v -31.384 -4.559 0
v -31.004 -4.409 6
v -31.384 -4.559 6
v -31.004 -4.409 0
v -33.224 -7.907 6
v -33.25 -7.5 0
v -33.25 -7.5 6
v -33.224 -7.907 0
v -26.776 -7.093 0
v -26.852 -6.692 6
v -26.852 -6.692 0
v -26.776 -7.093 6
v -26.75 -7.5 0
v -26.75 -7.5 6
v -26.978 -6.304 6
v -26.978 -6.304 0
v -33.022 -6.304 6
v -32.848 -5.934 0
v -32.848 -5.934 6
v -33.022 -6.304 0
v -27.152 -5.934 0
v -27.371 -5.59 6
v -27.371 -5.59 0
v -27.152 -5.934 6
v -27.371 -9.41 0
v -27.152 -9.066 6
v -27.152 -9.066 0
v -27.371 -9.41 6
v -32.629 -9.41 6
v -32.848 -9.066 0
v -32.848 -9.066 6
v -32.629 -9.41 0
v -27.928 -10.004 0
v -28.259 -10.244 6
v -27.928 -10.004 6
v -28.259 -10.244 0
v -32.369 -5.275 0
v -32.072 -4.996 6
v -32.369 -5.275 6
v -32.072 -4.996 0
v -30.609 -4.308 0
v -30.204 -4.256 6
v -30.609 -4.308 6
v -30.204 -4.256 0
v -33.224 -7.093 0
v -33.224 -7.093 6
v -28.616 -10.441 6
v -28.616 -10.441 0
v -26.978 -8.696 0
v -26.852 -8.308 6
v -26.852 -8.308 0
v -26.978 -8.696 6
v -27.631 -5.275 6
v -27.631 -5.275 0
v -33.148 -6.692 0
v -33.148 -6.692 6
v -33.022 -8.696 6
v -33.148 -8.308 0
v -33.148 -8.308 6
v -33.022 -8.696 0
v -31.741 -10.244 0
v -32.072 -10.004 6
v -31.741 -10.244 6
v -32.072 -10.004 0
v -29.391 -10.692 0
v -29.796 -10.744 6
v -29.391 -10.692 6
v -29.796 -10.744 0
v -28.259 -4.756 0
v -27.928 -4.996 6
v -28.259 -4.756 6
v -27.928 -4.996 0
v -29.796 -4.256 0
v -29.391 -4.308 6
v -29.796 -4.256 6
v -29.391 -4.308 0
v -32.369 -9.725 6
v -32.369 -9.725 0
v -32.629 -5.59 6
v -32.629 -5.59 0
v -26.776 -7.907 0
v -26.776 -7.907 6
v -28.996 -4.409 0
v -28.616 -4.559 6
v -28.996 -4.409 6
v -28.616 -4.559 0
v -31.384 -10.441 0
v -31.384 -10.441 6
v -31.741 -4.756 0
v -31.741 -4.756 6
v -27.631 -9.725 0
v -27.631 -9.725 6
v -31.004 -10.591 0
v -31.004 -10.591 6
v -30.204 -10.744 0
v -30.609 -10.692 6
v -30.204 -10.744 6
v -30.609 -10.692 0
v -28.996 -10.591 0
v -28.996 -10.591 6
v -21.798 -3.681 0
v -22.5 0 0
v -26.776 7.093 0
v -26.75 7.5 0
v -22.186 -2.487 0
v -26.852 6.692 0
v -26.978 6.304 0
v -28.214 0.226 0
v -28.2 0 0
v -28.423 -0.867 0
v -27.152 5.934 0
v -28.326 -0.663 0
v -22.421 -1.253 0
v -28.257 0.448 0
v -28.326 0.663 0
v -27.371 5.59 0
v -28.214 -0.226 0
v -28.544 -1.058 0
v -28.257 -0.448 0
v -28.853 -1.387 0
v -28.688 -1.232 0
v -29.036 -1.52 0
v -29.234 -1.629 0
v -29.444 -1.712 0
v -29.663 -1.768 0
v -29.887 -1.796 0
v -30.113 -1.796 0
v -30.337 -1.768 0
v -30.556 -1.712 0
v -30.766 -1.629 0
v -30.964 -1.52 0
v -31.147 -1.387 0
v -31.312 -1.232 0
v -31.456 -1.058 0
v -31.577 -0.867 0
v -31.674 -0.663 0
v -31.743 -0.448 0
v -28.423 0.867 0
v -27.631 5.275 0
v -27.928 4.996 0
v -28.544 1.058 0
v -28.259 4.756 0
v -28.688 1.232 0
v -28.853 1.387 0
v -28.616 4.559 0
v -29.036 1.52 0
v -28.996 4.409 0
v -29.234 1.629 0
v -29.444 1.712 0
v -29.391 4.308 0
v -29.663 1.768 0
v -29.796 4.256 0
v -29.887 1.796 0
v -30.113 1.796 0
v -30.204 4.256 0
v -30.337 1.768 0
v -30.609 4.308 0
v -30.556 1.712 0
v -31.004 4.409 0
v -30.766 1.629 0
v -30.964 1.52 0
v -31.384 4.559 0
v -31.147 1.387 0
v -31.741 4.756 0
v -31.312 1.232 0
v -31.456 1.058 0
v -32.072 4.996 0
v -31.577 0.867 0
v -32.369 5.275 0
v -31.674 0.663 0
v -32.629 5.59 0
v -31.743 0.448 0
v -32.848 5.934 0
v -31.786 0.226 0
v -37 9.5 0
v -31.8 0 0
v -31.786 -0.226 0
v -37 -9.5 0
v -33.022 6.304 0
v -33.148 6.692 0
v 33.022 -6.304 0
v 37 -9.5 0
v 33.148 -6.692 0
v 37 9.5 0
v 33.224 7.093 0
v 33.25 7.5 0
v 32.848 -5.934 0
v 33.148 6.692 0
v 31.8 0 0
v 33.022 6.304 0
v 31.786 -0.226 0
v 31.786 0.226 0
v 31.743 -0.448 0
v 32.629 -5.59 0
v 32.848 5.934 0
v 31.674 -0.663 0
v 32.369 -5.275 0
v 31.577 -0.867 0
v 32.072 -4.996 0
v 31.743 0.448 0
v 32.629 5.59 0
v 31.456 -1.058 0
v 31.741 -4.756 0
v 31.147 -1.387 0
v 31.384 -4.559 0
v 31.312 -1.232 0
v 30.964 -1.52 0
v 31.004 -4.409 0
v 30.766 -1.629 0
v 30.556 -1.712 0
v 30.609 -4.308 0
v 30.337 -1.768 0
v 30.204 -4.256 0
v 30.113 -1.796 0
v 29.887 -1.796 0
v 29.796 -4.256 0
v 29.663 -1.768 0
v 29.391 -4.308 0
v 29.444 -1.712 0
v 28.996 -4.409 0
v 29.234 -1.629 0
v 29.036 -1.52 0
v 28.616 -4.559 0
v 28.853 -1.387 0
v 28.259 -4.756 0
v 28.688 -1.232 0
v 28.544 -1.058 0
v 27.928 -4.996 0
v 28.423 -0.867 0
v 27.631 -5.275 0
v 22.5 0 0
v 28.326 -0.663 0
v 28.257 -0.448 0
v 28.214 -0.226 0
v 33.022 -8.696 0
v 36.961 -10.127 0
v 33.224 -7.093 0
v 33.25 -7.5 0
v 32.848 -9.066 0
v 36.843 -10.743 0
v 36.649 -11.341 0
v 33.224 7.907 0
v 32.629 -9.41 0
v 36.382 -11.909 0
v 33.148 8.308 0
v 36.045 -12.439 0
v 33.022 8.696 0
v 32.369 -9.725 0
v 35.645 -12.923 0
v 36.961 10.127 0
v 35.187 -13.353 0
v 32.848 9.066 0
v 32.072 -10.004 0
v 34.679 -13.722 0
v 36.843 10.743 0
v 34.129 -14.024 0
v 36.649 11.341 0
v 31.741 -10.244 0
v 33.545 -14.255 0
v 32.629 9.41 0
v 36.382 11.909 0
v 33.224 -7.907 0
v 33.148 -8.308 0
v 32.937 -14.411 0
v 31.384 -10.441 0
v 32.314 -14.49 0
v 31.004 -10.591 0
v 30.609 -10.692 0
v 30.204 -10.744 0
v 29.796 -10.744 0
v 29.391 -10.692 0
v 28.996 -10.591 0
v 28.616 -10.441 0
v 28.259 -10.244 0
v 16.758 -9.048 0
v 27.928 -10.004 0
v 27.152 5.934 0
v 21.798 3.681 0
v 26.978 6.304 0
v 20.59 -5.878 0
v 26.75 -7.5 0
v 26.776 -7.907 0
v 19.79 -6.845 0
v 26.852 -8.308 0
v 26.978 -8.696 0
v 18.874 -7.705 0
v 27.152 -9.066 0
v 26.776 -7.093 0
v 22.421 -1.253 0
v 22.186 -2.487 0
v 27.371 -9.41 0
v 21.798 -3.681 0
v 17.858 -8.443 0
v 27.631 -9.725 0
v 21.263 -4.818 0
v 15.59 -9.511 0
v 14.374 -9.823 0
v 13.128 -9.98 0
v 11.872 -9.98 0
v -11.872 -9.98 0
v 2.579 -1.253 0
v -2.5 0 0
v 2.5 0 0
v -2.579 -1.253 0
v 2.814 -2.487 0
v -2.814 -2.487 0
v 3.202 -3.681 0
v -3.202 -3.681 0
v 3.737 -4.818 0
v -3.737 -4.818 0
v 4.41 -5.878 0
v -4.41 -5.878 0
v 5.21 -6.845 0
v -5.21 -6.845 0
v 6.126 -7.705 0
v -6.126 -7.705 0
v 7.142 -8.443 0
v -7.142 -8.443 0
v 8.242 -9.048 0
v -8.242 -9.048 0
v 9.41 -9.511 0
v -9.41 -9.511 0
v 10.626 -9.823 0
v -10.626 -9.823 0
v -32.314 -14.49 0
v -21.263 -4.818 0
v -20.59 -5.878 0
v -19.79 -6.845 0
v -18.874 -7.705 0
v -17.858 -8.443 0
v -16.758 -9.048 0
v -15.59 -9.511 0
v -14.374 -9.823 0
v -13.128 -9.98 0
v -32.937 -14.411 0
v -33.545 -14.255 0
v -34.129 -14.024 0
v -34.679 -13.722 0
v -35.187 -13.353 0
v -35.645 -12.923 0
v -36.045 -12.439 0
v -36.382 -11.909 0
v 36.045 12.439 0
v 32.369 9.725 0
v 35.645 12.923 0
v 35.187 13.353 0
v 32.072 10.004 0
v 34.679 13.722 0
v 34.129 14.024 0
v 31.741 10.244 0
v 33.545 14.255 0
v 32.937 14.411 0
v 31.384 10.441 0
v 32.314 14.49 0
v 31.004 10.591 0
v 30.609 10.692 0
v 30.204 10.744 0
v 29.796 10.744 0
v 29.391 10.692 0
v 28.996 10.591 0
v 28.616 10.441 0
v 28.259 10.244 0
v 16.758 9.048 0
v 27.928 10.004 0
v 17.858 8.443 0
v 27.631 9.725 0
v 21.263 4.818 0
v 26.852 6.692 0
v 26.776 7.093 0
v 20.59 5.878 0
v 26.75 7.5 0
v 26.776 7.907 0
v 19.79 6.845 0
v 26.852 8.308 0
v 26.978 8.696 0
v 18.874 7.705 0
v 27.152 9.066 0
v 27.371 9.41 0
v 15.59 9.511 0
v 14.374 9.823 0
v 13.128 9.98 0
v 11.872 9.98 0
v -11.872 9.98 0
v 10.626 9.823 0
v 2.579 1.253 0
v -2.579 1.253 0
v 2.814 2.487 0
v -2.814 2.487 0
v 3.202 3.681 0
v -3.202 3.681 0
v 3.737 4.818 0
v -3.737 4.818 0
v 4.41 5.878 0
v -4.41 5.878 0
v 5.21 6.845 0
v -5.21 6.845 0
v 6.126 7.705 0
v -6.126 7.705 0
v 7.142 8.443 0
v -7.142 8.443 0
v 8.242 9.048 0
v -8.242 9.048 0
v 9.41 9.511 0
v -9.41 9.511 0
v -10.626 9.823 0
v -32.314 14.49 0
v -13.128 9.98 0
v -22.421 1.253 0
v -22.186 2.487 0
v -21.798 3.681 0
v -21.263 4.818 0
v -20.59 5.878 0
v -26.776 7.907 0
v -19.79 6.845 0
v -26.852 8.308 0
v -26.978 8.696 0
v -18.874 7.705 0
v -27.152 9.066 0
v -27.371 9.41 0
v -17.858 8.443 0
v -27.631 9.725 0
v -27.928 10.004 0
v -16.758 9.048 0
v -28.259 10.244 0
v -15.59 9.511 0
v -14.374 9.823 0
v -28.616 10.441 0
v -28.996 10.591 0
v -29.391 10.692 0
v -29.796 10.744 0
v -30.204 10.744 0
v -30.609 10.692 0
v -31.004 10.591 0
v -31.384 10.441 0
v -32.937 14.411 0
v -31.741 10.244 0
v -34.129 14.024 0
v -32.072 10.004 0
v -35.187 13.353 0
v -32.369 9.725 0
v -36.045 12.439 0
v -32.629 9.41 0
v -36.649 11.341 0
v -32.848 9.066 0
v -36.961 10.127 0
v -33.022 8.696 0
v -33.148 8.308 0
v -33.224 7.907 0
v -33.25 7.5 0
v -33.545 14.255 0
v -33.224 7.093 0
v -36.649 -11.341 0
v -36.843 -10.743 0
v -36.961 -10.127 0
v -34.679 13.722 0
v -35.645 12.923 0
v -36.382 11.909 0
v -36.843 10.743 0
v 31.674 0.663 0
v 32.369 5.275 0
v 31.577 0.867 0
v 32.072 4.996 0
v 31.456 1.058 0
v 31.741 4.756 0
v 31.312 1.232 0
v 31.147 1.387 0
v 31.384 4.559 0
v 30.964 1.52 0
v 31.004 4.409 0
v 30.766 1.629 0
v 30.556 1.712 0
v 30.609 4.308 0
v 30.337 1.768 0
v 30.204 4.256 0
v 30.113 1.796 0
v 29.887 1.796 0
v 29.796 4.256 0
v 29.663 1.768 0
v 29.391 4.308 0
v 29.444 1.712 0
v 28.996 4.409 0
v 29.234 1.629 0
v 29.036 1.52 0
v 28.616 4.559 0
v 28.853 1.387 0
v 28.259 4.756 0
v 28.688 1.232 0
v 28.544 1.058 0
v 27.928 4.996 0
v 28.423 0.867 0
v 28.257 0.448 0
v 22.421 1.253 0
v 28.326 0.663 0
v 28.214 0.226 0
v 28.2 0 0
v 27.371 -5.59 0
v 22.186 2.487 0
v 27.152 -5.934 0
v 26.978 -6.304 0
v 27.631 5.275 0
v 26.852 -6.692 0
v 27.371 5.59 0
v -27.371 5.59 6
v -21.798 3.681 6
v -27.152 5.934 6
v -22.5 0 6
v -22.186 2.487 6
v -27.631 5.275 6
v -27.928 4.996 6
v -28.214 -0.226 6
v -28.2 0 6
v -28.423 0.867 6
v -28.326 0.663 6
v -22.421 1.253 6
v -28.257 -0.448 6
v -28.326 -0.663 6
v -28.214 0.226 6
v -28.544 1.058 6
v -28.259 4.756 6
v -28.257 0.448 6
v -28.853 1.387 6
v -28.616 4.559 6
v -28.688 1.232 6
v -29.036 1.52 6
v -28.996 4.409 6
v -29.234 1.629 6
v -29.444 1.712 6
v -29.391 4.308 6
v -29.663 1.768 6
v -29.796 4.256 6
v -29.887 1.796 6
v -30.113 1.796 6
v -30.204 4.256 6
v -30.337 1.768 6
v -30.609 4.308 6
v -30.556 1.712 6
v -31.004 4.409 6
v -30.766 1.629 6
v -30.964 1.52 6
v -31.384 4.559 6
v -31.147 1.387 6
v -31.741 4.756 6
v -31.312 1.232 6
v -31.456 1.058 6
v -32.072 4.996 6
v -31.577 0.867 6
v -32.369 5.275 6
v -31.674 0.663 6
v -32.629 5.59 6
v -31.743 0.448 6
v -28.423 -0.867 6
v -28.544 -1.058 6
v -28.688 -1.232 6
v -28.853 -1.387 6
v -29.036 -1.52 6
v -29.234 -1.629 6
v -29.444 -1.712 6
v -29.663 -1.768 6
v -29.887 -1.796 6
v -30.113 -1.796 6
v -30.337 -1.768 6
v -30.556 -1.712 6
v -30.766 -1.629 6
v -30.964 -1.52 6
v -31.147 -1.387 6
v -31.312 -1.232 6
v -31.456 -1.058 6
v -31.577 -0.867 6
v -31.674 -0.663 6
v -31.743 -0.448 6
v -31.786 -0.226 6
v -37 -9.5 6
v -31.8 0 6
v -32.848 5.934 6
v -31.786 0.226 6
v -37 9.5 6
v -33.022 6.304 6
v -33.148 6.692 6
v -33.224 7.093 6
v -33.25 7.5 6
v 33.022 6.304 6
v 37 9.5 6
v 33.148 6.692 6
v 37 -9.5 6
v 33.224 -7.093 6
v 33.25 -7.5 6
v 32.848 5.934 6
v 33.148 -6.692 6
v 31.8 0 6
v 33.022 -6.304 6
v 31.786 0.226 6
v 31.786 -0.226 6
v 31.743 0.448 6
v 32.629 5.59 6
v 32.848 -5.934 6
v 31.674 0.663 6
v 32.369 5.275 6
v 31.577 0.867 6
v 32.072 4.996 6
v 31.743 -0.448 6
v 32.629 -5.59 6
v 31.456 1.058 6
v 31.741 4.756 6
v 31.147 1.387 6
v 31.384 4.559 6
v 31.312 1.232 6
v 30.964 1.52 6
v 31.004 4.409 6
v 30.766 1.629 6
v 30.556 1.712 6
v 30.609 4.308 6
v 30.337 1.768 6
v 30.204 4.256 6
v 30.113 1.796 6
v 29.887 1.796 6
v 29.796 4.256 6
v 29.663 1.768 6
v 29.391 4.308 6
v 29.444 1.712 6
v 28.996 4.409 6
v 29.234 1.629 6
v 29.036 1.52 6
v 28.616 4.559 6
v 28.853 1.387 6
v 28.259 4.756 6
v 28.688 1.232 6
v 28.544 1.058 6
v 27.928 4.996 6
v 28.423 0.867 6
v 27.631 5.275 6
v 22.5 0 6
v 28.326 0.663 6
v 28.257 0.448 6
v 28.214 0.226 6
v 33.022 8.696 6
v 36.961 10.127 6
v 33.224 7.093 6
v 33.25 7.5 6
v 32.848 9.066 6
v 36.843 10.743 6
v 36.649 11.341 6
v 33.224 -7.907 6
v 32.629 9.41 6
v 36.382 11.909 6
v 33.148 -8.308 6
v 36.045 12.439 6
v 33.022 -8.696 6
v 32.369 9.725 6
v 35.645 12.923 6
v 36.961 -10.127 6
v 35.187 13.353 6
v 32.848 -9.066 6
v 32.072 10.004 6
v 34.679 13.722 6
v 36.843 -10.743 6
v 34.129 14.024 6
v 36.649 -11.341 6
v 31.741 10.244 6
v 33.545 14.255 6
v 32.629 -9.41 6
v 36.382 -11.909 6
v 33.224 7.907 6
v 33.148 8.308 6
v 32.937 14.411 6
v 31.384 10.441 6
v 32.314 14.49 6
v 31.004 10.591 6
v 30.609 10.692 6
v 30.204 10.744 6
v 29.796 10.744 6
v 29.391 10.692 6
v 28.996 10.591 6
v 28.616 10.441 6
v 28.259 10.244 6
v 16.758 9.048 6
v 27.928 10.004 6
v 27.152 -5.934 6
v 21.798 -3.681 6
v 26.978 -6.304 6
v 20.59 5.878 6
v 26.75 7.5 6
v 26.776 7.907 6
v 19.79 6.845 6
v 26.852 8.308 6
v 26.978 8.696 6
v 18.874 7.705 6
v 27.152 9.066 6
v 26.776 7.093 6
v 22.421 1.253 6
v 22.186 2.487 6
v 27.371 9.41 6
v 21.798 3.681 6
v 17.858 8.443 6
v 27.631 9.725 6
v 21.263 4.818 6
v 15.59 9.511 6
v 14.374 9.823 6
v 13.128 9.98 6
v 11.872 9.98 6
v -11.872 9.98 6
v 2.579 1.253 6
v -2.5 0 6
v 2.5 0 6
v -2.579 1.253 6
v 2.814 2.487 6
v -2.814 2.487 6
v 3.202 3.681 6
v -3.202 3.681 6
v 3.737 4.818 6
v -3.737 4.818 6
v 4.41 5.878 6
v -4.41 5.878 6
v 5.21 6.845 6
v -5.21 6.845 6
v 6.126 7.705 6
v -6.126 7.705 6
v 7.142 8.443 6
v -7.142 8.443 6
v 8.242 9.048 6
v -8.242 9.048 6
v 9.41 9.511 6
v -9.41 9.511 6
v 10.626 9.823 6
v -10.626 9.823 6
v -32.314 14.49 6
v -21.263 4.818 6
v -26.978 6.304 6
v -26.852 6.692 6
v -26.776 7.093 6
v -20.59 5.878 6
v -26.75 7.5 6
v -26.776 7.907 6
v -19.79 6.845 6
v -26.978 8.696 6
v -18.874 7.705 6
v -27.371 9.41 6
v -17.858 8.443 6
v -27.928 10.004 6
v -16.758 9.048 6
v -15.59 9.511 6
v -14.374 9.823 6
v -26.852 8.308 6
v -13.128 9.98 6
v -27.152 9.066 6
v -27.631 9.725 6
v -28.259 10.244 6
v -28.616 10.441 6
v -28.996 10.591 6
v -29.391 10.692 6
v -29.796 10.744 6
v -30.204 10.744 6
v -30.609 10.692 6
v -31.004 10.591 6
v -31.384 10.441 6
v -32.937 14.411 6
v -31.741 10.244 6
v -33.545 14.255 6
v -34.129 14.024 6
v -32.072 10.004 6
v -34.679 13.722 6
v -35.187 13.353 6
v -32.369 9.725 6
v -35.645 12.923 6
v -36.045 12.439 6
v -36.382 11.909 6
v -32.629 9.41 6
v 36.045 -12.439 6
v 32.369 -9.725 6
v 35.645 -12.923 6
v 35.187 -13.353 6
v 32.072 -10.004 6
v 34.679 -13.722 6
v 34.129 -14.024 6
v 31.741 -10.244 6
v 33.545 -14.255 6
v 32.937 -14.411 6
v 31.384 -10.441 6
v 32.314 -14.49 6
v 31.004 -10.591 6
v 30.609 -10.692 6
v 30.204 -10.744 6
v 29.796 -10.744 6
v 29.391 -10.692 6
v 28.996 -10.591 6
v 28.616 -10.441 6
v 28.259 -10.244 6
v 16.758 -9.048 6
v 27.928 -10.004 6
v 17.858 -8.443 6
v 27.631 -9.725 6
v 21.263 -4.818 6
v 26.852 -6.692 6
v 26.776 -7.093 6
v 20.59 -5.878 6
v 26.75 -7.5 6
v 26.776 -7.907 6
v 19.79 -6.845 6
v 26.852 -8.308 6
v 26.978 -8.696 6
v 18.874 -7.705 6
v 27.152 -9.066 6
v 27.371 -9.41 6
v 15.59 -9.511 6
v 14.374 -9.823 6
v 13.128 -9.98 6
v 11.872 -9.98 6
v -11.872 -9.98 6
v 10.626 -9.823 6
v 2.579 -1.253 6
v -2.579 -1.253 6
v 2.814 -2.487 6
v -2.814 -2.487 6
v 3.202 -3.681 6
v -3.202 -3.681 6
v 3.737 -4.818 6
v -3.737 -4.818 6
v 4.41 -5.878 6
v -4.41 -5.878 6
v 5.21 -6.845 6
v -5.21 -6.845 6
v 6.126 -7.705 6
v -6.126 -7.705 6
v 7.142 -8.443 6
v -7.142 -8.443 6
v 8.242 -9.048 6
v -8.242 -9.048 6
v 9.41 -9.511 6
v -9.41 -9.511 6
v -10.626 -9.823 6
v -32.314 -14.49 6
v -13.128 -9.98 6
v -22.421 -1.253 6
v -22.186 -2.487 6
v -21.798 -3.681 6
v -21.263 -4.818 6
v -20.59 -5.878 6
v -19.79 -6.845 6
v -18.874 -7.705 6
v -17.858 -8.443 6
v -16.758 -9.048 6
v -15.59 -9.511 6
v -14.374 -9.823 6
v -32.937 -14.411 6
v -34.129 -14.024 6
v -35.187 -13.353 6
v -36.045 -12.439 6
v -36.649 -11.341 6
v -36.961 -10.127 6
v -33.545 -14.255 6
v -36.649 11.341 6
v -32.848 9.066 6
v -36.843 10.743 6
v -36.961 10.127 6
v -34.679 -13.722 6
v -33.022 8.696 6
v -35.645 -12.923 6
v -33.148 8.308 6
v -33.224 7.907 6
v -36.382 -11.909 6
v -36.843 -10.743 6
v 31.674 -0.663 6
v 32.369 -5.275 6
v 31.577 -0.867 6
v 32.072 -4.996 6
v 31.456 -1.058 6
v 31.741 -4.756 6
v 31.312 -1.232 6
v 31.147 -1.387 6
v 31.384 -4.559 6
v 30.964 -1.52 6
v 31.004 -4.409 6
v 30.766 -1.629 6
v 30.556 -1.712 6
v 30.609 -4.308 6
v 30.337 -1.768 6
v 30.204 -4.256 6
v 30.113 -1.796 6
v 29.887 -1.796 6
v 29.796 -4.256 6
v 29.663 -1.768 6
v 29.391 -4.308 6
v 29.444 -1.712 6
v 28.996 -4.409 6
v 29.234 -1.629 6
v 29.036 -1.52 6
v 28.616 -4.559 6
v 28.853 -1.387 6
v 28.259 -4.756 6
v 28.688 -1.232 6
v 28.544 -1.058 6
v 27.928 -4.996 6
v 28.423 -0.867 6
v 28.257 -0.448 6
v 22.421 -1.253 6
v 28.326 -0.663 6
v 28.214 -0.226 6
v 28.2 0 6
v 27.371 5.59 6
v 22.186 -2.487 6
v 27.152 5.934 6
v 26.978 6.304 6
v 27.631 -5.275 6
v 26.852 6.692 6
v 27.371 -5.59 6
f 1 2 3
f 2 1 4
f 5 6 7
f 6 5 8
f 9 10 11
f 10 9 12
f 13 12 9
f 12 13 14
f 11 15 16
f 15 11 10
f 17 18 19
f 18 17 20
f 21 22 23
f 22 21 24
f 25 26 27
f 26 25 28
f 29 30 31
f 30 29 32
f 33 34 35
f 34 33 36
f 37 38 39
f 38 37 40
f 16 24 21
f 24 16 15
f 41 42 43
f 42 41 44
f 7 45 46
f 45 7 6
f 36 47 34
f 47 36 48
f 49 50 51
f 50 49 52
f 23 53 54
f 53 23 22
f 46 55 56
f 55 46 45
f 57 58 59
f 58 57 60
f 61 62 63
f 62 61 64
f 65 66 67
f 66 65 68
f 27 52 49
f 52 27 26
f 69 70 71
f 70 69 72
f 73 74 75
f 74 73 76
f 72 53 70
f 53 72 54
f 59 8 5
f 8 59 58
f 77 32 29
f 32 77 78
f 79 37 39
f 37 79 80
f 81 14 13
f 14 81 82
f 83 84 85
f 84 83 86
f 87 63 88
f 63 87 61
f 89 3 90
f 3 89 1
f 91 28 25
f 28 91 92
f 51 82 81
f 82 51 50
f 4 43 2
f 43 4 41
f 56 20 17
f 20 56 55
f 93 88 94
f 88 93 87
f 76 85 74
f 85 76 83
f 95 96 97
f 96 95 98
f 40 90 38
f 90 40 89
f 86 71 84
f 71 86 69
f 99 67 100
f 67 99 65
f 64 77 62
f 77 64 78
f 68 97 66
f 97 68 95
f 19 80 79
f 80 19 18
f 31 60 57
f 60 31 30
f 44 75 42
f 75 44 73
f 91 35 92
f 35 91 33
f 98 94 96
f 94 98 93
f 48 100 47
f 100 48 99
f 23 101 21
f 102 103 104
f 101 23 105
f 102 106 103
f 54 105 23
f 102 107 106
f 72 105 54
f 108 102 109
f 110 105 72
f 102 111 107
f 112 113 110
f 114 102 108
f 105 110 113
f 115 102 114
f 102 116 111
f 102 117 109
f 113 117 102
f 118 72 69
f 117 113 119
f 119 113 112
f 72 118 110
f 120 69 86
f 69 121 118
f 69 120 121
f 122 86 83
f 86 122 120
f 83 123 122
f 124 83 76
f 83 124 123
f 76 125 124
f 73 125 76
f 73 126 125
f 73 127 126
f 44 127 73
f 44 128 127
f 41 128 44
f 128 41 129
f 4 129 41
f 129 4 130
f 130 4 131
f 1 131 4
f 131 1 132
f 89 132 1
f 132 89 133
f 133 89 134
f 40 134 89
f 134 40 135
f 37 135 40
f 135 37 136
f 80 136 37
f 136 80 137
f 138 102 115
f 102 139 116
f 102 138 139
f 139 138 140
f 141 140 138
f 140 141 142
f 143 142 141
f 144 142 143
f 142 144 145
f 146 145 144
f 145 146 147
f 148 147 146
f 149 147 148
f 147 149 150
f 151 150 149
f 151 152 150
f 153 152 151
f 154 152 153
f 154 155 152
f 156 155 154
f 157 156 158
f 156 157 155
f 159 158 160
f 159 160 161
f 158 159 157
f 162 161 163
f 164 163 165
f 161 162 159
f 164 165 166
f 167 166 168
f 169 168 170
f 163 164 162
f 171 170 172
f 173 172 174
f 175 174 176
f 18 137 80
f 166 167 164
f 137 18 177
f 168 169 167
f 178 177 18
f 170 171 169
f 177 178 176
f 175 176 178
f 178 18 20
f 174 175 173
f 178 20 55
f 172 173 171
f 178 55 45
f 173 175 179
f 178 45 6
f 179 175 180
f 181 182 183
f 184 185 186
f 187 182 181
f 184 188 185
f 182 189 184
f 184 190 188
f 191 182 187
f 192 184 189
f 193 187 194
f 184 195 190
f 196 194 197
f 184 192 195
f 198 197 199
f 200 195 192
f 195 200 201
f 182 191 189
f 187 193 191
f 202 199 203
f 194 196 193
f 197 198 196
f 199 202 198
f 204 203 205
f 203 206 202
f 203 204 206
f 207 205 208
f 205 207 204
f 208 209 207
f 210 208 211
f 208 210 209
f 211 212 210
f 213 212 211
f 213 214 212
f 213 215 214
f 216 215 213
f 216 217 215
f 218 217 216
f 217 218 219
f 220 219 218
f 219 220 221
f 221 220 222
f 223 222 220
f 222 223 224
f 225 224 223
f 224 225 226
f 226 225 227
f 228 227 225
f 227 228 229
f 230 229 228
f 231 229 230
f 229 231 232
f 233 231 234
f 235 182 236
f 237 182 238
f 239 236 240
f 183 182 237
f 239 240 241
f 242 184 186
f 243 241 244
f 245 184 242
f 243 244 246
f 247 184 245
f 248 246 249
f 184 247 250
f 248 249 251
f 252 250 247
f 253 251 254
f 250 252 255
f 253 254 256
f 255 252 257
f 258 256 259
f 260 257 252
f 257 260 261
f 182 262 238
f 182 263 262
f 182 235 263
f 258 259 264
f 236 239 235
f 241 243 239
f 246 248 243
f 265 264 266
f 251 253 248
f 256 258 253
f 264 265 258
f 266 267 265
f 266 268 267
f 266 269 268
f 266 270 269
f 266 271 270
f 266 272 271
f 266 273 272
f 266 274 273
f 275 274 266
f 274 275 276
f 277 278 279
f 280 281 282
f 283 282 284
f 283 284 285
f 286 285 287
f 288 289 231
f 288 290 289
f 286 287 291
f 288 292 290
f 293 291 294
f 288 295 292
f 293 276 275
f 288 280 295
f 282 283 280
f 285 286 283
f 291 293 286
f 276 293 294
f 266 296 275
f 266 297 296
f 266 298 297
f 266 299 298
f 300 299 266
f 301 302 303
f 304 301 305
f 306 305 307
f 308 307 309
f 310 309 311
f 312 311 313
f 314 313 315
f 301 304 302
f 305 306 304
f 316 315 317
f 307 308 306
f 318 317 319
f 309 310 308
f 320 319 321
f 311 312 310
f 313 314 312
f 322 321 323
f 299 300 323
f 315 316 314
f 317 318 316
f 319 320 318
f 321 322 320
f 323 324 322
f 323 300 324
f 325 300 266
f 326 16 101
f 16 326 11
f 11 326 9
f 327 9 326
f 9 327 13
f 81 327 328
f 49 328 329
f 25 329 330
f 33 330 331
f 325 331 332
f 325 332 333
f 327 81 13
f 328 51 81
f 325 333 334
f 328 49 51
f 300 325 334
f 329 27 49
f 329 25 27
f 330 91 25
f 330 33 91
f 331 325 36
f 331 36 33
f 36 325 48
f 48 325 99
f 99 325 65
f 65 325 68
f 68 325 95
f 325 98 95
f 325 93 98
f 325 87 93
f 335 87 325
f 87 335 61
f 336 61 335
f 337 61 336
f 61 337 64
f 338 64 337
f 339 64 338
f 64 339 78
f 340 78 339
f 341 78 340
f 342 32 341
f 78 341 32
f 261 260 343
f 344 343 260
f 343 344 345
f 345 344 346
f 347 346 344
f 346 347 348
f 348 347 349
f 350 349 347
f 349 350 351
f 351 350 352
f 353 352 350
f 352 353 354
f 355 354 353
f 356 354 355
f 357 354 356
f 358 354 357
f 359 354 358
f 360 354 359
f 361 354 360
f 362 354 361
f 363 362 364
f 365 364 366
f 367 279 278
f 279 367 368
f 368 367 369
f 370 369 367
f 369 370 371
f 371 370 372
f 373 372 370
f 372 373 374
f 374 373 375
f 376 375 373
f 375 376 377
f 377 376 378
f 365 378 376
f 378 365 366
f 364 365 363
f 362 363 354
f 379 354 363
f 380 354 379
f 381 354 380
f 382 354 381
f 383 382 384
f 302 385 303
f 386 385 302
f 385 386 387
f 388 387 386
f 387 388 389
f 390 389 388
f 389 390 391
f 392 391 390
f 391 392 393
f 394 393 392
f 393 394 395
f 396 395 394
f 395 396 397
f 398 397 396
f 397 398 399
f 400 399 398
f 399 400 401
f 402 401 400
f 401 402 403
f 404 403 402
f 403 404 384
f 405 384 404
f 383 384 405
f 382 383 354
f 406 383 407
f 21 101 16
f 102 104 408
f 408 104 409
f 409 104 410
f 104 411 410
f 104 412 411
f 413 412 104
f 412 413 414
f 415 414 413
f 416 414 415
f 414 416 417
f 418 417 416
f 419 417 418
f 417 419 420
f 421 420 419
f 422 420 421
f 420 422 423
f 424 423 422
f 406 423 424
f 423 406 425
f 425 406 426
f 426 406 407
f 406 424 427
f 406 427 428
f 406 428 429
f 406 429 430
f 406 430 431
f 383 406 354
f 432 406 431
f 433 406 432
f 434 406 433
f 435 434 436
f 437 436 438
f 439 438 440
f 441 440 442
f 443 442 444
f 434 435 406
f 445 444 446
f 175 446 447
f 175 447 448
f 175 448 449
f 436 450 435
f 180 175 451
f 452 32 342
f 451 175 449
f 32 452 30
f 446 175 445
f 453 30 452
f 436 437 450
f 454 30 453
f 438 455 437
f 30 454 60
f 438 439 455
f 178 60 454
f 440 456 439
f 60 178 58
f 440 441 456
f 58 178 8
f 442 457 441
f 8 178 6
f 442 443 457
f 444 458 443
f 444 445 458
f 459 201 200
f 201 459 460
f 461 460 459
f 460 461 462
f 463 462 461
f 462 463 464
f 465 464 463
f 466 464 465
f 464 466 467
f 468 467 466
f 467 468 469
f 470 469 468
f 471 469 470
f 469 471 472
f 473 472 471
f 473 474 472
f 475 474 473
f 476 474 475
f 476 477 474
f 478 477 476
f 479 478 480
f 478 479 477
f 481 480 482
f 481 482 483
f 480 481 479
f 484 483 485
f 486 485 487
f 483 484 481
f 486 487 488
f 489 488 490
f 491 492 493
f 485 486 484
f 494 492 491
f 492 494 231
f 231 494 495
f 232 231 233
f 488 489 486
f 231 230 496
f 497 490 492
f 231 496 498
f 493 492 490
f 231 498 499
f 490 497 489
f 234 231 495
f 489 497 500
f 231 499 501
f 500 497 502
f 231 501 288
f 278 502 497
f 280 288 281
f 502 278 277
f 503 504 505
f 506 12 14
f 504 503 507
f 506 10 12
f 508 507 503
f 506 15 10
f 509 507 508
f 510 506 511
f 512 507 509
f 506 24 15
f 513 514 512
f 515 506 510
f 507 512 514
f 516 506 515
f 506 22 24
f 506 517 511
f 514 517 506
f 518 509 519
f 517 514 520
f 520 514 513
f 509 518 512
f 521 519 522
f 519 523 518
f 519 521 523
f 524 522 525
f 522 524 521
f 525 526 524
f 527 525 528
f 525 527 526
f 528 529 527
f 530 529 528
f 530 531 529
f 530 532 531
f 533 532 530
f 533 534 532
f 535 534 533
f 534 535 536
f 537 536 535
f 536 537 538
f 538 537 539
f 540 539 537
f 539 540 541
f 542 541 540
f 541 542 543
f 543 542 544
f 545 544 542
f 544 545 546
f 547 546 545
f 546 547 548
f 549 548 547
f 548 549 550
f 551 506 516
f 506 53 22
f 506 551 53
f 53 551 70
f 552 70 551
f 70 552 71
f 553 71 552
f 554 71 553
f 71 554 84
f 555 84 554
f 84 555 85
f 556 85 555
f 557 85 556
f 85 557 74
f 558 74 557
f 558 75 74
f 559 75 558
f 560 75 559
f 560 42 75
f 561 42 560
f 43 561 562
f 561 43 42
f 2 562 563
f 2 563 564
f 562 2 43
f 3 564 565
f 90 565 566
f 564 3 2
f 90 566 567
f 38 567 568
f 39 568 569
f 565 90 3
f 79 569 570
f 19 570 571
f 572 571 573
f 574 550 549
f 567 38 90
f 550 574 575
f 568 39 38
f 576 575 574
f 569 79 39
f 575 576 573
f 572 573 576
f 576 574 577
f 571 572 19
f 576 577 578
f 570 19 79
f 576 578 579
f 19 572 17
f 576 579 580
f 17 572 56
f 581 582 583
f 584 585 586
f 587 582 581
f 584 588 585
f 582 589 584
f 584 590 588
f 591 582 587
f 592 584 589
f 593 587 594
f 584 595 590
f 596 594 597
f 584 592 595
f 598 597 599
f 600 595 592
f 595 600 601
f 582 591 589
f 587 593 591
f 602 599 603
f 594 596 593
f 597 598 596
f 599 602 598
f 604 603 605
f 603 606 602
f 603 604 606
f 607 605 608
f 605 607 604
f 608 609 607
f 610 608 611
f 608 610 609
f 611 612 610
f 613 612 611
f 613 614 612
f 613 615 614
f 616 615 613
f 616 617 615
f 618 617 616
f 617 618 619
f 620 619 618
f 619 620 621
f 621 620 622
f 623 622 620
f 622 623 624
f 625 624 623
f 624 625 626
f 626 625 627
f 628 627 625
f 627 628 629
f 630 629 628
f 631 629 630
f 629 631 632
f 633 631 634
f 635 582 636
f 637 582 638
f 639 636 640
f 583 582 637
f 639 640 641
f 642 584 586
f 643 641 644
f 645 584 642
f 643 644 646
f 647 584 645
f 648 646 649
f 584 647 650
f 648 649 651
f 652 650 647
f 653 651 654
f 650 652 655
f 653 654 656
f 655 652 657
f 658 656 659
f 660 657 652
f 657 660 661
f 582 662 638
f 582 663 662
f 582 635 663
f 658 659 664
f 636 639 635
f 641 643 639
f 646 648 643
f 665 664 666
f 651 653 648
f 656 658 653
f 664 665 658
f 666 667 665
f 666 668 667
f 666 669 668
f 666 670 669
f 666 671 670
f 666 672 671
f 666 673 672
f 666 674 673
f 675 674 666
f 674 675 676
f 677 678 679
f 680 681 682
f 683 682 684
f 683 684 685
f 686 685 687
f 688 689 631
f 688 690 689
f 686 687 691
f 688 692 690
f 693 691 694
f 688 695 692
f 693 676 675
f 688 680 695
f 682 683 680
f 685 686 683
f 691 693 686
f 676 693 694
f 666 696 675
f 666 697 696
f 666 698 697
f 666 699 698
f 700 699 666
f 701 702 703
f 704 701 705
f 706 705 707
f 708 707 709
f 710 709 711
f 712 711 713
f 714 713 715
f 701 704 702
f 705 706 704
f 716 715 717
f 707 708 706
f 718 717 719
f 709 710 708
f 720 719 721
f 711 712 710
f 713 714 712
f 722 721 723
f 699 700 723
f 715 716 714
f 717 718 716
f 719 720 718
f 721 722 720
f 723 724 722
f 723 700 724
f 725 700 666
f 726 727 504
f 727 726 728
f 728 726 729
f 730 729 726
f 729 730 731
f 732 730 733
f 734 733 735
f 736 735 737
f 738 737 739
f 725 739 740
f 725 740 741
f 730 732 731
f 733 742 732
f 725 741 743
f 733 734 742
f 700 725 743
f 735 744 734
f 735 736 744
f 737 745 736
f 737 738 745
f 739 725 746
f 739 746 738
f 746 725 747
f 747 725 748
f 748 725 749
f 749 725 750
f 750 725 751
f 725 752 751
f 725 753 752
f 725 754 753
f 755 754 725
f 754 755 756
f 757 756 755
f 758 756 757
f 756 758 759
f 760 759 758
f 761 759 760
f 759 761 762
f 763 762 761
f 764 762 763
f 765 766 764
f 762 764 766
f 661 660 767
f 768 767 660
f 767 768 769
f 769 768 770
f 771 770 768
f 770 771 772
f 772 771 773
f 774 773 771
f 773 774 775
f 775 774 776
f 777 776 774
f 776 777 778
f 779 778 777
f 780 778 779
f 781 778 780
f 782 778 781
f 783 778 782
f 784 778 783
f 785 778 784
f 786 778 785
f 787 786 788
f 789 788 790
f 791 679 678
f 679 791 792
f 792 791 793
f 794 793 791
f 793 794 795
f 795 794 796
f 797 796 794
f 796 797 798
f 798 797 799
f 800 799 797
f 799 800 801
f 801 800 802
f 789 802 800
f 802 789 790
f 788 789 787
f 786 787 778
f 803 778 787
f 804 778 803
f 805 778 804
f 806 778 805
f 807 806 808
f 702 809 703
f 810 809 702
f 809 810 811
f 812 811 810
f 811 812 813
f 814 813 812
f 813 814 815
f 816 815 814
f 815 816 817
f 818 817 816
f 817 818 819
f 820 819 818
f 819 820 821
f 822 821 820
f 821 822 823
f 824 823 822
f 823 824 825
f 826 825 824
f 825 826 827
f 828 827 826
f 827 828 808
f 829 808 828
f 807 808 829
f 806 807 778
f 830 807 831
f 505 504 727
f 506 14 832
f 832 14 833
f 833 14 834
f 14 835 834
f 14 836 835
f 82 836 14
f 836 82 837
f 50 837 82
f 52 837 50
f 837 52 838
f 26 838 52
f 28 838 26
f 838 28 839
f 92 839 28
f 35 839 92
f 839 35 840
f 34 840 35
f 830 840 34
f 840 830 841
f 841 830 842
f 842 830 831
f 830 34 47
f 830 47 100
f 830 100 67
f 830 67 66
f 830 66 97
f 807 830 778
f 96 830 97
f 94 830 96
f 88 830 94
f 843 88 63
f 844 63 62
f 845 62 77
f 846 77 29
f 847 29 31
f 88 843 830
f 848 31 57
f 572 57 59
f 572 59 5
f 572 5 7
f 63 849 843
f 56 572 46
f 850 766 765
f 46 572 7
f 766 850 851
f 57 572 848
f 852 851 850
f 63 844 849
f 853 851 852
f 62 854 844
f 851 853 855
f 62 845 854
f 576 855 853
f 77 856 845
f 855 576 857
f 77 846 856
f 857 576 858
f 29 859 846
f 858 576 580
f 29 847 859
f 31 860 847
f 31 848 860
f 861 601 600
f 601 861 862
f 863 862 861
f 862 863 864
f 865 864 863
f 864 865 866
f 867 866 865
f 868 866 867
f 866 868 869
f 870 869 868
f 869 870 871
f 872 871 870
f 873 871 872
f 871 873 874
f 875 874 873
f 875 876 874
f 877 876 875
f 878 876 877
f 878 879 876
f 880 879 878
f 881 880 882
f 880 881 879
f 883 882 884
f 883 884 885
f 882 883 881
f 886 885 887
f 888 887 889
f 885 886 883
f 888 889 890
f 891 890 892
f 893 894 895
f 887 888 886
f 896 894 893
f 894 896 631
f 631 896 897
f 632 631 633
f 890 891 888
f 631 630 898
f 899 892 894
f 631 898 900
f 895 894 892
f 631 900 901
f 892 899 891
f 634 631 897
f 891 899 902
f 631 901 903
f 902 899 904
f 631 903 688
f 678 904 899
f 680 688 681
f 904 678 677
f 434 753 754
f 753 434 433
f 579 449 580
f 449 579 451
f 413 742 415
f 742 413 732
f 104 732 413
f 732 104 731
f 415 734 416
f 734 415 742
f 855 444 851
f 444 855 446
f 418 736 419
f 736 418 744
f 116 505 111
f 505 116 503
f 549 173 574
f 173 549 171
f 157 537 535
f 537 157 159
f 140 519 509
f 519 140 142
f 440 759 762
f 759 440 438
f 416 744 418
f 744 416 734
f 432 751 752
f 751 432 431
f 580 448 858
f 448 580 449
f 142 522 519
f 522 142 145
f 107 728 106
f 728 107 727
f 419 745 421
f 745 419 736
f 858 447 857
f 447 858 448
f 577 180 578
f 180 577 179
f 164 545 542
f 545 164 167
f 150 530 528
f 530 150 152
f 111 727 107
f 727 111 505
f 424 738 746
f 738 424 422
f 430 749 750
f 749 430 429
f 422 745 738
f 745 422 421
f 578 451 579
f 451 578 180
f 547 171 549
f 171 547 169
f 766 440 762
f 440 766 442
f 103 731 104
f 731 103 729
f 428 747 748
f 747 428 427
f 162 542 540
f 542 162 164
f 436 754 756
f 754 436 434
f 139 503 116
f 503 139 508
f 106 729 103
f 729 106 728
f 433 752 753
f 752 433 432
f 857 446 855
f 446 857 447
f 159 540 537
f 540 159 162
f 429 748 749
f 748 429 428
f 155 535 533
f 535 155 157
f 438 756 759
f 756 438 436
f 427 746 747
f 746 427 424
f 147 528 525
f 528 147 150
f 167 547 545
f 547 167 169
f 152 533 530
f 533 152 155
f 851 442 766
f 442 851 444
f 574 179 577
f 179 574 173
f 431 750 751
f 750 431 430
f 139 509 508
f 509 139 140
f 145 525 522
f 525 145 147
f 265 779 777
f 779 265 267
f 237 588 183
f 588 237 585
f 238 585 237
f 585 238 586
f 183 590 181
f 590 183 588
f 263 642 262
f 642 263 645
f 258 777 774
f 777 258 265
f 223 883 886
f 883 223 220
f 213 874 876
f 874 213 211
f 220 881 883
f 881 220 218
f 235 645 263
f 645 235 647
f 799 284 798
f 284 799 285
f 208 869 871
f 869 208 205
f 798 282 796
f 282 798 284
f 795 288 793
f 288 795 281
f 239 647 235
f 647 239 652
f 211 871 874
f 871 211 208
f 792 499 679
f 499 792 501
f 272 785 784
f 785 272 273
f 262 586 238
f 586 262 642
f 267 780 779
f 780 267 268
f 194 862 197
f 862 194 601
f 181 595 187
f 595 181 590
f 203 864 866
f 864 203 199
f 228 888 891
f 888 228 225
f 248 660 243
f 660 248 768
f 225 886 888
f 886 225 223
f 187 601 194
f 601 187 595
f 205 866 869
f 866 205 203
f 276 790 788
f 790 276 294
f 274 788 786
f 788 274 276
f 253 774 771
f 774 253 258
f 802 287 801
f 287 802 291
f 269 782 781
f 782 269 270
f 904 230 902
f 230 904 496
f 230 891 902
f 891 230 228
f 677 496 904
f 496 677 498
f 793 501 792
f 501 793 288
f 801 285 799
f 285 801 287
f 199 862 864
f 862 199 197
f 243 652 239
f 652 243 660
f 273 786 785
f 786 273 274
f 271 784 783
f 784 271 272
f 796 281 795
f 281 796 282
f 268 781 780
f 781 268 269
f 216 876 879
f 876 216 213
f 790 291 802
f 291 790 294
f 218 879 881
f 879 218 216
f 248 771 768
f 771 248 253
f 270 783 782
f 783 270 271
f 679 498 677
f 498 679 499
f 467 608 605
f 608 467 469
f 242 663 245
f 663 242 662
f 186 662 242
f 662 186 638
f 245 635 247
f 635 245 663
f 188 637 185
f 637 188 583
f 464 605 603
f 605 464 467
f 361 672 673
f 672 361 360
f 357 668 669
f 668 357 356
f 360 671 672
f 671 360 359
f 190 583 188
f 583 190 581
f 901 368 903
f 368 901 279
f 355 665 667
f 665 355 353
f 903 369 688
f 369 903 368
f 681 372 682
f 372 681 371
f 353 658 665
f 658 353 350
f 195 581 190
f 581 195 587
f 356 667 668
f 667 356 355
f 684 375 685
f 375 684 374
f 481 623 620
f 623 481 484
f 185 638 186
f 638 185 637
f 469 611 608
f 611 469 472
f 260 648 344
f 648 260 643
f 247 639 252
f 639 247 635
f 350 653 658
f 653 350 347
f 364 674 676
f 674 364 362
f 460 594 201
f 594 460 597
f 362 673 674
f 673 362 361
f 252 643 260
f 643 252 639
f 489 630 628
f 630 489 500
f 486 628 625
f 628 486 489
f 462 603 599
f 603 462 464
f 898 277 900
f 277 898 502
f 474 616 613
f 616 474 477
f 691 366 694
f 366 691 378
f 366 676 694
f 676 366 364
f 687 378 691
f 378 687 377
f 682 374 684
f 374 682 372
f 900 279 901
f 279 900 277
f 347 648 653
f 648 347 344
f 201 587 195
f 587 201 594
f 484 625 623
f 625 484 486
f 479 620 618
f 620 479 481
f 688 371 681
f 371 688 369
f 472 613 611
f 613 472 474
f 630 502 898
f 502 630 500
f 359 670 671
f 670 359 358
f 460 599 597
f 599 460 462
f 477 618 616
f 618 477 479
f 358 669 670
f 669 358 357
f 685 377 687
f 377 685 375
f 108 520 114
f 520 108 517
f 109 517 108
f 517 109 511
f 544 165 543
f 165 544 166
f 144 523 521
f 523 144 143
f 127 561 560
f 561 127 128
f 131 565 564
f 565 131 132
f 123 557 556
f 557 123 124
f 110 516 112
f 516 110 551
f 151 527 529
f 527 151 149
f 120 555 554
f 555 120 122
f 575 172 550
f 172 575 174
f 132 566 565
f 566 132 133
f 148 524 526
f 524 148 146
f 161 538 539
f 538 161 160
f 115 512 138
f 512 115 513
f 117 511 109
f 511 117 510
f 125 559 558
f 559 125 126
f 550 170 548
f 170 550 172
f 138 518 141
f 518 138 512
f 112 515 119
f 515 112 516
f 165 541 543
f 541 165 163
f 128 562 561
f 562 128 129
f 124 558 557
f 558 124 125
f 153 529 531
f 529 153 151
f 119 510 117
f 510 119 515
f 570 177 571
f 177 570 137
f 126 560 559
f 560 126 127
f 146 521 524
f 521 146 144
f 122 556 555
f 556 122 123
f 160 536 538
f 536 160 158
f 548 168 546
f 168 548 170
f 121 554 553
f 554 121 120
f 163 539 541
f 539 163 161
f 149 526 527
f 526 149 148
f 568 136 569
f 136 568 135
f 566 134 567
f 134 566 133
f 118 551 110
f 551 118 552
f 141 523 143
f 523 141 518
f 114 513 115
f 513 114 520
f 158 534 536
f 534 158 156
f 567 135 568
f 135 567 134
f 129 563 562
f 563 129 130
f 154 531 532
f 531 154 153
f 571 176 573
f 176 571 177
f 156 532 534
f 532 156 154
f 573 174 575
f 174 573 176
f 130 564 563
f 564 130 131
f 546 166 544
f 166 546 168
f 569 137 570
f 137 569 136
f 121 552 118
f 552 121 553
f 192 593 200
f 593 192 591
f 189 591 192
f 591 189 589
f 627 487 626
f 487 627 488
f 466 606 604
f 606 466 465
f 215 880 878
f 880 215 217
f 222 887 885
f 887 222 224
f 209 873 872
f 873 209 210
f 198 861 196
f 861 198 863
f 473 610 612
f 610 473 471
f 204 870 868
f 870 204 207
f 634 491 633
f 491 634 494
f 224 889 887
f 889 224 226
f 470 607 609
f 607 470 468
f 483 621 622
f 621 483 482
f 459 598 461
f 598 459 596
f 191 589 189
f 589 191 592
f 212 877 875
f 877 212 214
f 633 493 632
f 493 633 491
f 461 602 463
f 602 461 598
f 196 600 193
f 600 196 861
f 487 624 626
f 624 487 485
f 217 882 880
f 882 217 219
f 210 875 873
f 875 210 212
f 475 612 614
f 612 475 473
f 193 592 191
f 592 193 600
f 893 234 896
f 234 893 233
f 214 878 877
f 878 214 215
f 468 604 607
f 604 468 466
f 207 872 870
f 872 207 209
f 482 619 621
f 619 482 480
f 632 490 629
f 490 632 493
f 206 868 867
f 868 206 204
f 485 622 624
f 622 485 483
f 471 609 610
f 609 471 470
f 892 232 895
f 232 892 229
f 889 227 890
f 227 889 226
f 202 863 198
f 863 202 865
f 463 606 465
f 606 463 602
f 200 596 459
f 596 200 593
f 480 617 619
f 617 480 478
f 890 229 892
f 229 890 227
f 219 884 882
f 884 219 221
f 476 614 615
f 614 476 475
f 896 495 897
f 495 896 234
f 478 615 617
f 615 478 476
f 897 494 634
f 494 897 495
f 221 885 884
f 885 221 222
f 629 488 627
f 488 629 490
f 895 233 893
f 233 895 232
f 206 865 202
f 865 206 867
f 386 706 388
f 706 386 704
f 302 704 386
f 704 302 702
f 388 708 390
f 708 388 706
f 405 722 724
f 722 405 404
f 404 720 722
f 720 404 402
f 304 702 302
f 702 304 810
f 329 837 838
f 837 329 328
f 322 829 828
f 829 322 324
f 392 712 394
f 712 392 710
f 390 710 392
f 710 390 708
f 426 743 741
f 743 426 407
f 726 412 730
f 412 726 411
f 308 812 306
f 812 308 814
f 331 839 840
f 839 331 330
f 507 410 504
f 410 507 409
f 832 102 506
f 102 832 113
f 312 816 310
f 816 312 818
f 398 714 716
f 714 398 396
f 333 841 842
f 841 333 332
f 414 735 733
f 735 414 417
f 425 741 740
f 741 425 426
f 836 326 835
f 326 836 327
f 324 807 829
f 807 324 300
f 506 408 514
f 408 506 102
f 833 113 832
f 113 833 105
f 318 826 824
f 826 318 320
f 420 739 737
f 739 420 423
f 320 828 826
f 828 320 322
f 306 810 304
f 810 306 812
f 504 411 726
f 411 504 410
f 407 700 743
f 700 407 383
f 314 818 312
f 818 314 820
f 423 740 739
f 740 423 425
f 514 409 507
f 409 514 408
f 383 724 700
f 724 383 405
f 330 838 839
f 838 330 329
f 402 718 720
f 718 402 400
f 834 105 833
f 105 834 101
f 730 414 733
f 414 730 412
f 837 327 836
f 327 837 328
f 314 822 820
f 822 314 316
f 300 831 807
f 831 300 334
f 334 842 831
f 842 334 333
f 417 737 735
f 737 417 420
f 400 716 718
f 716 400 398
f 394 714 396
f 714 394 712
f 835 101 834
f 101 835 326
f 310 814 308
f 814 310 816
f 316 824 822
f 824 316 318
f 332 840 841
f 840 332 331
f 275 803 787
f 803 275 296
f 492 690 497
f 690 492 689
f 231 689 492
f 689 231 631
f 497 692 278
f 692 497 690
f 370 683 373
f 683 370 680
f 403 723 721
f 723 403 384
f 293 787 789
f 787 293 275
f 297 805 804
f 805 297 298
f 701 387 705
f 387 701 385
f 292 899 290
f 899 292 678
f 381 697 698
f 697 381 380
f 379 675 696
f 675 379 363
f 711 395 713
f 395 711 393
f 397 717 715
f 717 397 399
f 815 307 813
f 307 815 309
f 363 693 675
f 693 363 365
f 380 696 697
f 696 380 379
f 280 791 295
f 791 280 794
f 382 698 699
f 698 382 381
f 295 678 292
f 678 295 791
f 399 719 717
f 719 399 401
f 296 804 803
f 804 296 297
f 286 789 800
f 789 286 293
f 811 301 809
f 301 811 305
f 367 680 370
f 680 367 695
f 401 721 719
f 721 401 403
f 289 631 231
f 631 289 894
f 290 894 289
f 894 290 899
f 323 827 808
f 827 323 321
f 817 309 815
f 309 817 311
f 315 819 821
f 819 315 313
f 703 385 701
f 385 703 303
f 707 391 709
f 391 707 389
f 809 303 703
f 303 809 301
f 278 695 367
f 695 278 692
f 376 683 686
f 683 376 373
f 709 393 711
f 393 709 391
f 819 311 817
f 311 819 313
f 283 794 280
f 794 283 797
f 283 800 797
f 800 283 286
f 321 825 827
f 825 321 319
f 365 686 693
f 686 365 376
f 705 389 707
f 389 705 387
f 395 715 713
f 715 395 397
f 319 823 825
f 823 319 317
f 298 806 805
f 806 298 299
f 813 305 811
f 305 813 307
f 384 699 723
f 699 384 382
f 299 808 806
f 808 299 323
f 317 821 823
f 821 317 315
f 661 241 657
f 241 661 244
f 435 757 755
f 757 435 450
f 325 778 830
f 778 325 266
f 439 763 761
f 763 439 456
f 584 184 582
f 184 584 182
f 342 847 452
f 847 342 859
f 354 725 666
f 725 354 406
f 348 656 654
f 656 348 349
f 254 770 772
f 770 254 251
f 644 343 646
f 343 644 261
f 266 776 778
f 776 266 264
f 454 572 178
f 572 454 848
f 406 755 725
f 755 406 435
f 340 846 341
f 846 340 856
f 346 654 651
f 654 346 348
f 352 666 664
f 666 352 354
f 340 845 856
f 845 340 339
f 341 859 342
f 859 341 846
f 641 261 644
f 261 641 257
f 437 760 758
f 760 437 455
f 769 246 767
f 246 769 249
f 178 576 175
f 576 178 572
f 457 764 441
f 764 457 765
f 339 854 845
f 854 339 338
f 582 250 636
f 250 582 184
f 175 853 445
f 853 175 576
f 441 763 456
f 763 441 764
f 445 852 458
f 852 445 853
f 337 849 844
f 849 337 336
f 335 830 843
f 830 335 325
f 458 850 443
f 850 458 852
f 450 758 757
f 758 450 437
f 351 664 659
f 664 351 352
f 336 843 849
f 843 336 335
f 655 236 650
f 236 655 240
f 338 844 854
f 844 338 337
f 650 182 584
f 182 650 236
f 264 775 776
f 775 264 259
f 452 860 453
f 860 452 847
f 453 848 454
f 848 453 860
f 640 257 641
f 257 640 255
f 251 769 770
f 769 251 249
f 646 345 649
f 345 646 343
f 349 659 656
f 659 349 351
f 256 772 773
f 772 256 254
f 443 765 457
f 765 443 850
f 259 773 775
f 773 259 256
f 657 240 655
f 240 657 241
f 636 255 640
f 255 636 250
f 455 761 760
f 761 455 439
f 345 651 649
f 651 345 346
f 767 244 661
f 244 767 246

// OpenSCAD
$fn = 50;

difference() {
	union() {
		hull() {
			translate(v = [-32.0, 9.5, 0]) {
				cylinder(h = 6, r = 5);
			}
			translate(v = [32.0, 9.5, 0]) {
				cylinder(h = 6, r = 5);
			}
			translate(v = [-32.0, -9.5, 0]) {
				cylinder(h = 6, r = 5);
			}
			translate(v = [32.0, -9.5, 0]) {
				cylinder(h = 6, r = 5);
			}
		}
	}
	union() {
		translate(v = [-30.0, -7.5, 0]) {
			cylinder(h = 6, r = 3.25);
		}
		translate(v = [-30.0, 7.5, 0]) {
			cylinder(h = 6, r = 3.25);
		}
		translate(v = [30.0, -7.5, 0]) {
			cylinder(h = 6, r = 3.25);
		}
		translate(v = [30.0, 7.5, 0]) {
			cylinder(h = 6, r = 3.25);
		}
		translate(v = [-30.0, 0.0, 0]) {
			cylinder(h = 6, r = 1.8);
		}
		translate(v = [30.0, 0.0, 0]) {
			cylinder(h = 6, r = 1.8);
		}
		translate(v = [-12.5, 0, 0.0]) {
			cylinder(h = 6, r = 10.0);
		}
		translate(v = [12.5, 0, 0.0]) {
			cylinder(h = 6, r = 10.0);
		}
	}
}
